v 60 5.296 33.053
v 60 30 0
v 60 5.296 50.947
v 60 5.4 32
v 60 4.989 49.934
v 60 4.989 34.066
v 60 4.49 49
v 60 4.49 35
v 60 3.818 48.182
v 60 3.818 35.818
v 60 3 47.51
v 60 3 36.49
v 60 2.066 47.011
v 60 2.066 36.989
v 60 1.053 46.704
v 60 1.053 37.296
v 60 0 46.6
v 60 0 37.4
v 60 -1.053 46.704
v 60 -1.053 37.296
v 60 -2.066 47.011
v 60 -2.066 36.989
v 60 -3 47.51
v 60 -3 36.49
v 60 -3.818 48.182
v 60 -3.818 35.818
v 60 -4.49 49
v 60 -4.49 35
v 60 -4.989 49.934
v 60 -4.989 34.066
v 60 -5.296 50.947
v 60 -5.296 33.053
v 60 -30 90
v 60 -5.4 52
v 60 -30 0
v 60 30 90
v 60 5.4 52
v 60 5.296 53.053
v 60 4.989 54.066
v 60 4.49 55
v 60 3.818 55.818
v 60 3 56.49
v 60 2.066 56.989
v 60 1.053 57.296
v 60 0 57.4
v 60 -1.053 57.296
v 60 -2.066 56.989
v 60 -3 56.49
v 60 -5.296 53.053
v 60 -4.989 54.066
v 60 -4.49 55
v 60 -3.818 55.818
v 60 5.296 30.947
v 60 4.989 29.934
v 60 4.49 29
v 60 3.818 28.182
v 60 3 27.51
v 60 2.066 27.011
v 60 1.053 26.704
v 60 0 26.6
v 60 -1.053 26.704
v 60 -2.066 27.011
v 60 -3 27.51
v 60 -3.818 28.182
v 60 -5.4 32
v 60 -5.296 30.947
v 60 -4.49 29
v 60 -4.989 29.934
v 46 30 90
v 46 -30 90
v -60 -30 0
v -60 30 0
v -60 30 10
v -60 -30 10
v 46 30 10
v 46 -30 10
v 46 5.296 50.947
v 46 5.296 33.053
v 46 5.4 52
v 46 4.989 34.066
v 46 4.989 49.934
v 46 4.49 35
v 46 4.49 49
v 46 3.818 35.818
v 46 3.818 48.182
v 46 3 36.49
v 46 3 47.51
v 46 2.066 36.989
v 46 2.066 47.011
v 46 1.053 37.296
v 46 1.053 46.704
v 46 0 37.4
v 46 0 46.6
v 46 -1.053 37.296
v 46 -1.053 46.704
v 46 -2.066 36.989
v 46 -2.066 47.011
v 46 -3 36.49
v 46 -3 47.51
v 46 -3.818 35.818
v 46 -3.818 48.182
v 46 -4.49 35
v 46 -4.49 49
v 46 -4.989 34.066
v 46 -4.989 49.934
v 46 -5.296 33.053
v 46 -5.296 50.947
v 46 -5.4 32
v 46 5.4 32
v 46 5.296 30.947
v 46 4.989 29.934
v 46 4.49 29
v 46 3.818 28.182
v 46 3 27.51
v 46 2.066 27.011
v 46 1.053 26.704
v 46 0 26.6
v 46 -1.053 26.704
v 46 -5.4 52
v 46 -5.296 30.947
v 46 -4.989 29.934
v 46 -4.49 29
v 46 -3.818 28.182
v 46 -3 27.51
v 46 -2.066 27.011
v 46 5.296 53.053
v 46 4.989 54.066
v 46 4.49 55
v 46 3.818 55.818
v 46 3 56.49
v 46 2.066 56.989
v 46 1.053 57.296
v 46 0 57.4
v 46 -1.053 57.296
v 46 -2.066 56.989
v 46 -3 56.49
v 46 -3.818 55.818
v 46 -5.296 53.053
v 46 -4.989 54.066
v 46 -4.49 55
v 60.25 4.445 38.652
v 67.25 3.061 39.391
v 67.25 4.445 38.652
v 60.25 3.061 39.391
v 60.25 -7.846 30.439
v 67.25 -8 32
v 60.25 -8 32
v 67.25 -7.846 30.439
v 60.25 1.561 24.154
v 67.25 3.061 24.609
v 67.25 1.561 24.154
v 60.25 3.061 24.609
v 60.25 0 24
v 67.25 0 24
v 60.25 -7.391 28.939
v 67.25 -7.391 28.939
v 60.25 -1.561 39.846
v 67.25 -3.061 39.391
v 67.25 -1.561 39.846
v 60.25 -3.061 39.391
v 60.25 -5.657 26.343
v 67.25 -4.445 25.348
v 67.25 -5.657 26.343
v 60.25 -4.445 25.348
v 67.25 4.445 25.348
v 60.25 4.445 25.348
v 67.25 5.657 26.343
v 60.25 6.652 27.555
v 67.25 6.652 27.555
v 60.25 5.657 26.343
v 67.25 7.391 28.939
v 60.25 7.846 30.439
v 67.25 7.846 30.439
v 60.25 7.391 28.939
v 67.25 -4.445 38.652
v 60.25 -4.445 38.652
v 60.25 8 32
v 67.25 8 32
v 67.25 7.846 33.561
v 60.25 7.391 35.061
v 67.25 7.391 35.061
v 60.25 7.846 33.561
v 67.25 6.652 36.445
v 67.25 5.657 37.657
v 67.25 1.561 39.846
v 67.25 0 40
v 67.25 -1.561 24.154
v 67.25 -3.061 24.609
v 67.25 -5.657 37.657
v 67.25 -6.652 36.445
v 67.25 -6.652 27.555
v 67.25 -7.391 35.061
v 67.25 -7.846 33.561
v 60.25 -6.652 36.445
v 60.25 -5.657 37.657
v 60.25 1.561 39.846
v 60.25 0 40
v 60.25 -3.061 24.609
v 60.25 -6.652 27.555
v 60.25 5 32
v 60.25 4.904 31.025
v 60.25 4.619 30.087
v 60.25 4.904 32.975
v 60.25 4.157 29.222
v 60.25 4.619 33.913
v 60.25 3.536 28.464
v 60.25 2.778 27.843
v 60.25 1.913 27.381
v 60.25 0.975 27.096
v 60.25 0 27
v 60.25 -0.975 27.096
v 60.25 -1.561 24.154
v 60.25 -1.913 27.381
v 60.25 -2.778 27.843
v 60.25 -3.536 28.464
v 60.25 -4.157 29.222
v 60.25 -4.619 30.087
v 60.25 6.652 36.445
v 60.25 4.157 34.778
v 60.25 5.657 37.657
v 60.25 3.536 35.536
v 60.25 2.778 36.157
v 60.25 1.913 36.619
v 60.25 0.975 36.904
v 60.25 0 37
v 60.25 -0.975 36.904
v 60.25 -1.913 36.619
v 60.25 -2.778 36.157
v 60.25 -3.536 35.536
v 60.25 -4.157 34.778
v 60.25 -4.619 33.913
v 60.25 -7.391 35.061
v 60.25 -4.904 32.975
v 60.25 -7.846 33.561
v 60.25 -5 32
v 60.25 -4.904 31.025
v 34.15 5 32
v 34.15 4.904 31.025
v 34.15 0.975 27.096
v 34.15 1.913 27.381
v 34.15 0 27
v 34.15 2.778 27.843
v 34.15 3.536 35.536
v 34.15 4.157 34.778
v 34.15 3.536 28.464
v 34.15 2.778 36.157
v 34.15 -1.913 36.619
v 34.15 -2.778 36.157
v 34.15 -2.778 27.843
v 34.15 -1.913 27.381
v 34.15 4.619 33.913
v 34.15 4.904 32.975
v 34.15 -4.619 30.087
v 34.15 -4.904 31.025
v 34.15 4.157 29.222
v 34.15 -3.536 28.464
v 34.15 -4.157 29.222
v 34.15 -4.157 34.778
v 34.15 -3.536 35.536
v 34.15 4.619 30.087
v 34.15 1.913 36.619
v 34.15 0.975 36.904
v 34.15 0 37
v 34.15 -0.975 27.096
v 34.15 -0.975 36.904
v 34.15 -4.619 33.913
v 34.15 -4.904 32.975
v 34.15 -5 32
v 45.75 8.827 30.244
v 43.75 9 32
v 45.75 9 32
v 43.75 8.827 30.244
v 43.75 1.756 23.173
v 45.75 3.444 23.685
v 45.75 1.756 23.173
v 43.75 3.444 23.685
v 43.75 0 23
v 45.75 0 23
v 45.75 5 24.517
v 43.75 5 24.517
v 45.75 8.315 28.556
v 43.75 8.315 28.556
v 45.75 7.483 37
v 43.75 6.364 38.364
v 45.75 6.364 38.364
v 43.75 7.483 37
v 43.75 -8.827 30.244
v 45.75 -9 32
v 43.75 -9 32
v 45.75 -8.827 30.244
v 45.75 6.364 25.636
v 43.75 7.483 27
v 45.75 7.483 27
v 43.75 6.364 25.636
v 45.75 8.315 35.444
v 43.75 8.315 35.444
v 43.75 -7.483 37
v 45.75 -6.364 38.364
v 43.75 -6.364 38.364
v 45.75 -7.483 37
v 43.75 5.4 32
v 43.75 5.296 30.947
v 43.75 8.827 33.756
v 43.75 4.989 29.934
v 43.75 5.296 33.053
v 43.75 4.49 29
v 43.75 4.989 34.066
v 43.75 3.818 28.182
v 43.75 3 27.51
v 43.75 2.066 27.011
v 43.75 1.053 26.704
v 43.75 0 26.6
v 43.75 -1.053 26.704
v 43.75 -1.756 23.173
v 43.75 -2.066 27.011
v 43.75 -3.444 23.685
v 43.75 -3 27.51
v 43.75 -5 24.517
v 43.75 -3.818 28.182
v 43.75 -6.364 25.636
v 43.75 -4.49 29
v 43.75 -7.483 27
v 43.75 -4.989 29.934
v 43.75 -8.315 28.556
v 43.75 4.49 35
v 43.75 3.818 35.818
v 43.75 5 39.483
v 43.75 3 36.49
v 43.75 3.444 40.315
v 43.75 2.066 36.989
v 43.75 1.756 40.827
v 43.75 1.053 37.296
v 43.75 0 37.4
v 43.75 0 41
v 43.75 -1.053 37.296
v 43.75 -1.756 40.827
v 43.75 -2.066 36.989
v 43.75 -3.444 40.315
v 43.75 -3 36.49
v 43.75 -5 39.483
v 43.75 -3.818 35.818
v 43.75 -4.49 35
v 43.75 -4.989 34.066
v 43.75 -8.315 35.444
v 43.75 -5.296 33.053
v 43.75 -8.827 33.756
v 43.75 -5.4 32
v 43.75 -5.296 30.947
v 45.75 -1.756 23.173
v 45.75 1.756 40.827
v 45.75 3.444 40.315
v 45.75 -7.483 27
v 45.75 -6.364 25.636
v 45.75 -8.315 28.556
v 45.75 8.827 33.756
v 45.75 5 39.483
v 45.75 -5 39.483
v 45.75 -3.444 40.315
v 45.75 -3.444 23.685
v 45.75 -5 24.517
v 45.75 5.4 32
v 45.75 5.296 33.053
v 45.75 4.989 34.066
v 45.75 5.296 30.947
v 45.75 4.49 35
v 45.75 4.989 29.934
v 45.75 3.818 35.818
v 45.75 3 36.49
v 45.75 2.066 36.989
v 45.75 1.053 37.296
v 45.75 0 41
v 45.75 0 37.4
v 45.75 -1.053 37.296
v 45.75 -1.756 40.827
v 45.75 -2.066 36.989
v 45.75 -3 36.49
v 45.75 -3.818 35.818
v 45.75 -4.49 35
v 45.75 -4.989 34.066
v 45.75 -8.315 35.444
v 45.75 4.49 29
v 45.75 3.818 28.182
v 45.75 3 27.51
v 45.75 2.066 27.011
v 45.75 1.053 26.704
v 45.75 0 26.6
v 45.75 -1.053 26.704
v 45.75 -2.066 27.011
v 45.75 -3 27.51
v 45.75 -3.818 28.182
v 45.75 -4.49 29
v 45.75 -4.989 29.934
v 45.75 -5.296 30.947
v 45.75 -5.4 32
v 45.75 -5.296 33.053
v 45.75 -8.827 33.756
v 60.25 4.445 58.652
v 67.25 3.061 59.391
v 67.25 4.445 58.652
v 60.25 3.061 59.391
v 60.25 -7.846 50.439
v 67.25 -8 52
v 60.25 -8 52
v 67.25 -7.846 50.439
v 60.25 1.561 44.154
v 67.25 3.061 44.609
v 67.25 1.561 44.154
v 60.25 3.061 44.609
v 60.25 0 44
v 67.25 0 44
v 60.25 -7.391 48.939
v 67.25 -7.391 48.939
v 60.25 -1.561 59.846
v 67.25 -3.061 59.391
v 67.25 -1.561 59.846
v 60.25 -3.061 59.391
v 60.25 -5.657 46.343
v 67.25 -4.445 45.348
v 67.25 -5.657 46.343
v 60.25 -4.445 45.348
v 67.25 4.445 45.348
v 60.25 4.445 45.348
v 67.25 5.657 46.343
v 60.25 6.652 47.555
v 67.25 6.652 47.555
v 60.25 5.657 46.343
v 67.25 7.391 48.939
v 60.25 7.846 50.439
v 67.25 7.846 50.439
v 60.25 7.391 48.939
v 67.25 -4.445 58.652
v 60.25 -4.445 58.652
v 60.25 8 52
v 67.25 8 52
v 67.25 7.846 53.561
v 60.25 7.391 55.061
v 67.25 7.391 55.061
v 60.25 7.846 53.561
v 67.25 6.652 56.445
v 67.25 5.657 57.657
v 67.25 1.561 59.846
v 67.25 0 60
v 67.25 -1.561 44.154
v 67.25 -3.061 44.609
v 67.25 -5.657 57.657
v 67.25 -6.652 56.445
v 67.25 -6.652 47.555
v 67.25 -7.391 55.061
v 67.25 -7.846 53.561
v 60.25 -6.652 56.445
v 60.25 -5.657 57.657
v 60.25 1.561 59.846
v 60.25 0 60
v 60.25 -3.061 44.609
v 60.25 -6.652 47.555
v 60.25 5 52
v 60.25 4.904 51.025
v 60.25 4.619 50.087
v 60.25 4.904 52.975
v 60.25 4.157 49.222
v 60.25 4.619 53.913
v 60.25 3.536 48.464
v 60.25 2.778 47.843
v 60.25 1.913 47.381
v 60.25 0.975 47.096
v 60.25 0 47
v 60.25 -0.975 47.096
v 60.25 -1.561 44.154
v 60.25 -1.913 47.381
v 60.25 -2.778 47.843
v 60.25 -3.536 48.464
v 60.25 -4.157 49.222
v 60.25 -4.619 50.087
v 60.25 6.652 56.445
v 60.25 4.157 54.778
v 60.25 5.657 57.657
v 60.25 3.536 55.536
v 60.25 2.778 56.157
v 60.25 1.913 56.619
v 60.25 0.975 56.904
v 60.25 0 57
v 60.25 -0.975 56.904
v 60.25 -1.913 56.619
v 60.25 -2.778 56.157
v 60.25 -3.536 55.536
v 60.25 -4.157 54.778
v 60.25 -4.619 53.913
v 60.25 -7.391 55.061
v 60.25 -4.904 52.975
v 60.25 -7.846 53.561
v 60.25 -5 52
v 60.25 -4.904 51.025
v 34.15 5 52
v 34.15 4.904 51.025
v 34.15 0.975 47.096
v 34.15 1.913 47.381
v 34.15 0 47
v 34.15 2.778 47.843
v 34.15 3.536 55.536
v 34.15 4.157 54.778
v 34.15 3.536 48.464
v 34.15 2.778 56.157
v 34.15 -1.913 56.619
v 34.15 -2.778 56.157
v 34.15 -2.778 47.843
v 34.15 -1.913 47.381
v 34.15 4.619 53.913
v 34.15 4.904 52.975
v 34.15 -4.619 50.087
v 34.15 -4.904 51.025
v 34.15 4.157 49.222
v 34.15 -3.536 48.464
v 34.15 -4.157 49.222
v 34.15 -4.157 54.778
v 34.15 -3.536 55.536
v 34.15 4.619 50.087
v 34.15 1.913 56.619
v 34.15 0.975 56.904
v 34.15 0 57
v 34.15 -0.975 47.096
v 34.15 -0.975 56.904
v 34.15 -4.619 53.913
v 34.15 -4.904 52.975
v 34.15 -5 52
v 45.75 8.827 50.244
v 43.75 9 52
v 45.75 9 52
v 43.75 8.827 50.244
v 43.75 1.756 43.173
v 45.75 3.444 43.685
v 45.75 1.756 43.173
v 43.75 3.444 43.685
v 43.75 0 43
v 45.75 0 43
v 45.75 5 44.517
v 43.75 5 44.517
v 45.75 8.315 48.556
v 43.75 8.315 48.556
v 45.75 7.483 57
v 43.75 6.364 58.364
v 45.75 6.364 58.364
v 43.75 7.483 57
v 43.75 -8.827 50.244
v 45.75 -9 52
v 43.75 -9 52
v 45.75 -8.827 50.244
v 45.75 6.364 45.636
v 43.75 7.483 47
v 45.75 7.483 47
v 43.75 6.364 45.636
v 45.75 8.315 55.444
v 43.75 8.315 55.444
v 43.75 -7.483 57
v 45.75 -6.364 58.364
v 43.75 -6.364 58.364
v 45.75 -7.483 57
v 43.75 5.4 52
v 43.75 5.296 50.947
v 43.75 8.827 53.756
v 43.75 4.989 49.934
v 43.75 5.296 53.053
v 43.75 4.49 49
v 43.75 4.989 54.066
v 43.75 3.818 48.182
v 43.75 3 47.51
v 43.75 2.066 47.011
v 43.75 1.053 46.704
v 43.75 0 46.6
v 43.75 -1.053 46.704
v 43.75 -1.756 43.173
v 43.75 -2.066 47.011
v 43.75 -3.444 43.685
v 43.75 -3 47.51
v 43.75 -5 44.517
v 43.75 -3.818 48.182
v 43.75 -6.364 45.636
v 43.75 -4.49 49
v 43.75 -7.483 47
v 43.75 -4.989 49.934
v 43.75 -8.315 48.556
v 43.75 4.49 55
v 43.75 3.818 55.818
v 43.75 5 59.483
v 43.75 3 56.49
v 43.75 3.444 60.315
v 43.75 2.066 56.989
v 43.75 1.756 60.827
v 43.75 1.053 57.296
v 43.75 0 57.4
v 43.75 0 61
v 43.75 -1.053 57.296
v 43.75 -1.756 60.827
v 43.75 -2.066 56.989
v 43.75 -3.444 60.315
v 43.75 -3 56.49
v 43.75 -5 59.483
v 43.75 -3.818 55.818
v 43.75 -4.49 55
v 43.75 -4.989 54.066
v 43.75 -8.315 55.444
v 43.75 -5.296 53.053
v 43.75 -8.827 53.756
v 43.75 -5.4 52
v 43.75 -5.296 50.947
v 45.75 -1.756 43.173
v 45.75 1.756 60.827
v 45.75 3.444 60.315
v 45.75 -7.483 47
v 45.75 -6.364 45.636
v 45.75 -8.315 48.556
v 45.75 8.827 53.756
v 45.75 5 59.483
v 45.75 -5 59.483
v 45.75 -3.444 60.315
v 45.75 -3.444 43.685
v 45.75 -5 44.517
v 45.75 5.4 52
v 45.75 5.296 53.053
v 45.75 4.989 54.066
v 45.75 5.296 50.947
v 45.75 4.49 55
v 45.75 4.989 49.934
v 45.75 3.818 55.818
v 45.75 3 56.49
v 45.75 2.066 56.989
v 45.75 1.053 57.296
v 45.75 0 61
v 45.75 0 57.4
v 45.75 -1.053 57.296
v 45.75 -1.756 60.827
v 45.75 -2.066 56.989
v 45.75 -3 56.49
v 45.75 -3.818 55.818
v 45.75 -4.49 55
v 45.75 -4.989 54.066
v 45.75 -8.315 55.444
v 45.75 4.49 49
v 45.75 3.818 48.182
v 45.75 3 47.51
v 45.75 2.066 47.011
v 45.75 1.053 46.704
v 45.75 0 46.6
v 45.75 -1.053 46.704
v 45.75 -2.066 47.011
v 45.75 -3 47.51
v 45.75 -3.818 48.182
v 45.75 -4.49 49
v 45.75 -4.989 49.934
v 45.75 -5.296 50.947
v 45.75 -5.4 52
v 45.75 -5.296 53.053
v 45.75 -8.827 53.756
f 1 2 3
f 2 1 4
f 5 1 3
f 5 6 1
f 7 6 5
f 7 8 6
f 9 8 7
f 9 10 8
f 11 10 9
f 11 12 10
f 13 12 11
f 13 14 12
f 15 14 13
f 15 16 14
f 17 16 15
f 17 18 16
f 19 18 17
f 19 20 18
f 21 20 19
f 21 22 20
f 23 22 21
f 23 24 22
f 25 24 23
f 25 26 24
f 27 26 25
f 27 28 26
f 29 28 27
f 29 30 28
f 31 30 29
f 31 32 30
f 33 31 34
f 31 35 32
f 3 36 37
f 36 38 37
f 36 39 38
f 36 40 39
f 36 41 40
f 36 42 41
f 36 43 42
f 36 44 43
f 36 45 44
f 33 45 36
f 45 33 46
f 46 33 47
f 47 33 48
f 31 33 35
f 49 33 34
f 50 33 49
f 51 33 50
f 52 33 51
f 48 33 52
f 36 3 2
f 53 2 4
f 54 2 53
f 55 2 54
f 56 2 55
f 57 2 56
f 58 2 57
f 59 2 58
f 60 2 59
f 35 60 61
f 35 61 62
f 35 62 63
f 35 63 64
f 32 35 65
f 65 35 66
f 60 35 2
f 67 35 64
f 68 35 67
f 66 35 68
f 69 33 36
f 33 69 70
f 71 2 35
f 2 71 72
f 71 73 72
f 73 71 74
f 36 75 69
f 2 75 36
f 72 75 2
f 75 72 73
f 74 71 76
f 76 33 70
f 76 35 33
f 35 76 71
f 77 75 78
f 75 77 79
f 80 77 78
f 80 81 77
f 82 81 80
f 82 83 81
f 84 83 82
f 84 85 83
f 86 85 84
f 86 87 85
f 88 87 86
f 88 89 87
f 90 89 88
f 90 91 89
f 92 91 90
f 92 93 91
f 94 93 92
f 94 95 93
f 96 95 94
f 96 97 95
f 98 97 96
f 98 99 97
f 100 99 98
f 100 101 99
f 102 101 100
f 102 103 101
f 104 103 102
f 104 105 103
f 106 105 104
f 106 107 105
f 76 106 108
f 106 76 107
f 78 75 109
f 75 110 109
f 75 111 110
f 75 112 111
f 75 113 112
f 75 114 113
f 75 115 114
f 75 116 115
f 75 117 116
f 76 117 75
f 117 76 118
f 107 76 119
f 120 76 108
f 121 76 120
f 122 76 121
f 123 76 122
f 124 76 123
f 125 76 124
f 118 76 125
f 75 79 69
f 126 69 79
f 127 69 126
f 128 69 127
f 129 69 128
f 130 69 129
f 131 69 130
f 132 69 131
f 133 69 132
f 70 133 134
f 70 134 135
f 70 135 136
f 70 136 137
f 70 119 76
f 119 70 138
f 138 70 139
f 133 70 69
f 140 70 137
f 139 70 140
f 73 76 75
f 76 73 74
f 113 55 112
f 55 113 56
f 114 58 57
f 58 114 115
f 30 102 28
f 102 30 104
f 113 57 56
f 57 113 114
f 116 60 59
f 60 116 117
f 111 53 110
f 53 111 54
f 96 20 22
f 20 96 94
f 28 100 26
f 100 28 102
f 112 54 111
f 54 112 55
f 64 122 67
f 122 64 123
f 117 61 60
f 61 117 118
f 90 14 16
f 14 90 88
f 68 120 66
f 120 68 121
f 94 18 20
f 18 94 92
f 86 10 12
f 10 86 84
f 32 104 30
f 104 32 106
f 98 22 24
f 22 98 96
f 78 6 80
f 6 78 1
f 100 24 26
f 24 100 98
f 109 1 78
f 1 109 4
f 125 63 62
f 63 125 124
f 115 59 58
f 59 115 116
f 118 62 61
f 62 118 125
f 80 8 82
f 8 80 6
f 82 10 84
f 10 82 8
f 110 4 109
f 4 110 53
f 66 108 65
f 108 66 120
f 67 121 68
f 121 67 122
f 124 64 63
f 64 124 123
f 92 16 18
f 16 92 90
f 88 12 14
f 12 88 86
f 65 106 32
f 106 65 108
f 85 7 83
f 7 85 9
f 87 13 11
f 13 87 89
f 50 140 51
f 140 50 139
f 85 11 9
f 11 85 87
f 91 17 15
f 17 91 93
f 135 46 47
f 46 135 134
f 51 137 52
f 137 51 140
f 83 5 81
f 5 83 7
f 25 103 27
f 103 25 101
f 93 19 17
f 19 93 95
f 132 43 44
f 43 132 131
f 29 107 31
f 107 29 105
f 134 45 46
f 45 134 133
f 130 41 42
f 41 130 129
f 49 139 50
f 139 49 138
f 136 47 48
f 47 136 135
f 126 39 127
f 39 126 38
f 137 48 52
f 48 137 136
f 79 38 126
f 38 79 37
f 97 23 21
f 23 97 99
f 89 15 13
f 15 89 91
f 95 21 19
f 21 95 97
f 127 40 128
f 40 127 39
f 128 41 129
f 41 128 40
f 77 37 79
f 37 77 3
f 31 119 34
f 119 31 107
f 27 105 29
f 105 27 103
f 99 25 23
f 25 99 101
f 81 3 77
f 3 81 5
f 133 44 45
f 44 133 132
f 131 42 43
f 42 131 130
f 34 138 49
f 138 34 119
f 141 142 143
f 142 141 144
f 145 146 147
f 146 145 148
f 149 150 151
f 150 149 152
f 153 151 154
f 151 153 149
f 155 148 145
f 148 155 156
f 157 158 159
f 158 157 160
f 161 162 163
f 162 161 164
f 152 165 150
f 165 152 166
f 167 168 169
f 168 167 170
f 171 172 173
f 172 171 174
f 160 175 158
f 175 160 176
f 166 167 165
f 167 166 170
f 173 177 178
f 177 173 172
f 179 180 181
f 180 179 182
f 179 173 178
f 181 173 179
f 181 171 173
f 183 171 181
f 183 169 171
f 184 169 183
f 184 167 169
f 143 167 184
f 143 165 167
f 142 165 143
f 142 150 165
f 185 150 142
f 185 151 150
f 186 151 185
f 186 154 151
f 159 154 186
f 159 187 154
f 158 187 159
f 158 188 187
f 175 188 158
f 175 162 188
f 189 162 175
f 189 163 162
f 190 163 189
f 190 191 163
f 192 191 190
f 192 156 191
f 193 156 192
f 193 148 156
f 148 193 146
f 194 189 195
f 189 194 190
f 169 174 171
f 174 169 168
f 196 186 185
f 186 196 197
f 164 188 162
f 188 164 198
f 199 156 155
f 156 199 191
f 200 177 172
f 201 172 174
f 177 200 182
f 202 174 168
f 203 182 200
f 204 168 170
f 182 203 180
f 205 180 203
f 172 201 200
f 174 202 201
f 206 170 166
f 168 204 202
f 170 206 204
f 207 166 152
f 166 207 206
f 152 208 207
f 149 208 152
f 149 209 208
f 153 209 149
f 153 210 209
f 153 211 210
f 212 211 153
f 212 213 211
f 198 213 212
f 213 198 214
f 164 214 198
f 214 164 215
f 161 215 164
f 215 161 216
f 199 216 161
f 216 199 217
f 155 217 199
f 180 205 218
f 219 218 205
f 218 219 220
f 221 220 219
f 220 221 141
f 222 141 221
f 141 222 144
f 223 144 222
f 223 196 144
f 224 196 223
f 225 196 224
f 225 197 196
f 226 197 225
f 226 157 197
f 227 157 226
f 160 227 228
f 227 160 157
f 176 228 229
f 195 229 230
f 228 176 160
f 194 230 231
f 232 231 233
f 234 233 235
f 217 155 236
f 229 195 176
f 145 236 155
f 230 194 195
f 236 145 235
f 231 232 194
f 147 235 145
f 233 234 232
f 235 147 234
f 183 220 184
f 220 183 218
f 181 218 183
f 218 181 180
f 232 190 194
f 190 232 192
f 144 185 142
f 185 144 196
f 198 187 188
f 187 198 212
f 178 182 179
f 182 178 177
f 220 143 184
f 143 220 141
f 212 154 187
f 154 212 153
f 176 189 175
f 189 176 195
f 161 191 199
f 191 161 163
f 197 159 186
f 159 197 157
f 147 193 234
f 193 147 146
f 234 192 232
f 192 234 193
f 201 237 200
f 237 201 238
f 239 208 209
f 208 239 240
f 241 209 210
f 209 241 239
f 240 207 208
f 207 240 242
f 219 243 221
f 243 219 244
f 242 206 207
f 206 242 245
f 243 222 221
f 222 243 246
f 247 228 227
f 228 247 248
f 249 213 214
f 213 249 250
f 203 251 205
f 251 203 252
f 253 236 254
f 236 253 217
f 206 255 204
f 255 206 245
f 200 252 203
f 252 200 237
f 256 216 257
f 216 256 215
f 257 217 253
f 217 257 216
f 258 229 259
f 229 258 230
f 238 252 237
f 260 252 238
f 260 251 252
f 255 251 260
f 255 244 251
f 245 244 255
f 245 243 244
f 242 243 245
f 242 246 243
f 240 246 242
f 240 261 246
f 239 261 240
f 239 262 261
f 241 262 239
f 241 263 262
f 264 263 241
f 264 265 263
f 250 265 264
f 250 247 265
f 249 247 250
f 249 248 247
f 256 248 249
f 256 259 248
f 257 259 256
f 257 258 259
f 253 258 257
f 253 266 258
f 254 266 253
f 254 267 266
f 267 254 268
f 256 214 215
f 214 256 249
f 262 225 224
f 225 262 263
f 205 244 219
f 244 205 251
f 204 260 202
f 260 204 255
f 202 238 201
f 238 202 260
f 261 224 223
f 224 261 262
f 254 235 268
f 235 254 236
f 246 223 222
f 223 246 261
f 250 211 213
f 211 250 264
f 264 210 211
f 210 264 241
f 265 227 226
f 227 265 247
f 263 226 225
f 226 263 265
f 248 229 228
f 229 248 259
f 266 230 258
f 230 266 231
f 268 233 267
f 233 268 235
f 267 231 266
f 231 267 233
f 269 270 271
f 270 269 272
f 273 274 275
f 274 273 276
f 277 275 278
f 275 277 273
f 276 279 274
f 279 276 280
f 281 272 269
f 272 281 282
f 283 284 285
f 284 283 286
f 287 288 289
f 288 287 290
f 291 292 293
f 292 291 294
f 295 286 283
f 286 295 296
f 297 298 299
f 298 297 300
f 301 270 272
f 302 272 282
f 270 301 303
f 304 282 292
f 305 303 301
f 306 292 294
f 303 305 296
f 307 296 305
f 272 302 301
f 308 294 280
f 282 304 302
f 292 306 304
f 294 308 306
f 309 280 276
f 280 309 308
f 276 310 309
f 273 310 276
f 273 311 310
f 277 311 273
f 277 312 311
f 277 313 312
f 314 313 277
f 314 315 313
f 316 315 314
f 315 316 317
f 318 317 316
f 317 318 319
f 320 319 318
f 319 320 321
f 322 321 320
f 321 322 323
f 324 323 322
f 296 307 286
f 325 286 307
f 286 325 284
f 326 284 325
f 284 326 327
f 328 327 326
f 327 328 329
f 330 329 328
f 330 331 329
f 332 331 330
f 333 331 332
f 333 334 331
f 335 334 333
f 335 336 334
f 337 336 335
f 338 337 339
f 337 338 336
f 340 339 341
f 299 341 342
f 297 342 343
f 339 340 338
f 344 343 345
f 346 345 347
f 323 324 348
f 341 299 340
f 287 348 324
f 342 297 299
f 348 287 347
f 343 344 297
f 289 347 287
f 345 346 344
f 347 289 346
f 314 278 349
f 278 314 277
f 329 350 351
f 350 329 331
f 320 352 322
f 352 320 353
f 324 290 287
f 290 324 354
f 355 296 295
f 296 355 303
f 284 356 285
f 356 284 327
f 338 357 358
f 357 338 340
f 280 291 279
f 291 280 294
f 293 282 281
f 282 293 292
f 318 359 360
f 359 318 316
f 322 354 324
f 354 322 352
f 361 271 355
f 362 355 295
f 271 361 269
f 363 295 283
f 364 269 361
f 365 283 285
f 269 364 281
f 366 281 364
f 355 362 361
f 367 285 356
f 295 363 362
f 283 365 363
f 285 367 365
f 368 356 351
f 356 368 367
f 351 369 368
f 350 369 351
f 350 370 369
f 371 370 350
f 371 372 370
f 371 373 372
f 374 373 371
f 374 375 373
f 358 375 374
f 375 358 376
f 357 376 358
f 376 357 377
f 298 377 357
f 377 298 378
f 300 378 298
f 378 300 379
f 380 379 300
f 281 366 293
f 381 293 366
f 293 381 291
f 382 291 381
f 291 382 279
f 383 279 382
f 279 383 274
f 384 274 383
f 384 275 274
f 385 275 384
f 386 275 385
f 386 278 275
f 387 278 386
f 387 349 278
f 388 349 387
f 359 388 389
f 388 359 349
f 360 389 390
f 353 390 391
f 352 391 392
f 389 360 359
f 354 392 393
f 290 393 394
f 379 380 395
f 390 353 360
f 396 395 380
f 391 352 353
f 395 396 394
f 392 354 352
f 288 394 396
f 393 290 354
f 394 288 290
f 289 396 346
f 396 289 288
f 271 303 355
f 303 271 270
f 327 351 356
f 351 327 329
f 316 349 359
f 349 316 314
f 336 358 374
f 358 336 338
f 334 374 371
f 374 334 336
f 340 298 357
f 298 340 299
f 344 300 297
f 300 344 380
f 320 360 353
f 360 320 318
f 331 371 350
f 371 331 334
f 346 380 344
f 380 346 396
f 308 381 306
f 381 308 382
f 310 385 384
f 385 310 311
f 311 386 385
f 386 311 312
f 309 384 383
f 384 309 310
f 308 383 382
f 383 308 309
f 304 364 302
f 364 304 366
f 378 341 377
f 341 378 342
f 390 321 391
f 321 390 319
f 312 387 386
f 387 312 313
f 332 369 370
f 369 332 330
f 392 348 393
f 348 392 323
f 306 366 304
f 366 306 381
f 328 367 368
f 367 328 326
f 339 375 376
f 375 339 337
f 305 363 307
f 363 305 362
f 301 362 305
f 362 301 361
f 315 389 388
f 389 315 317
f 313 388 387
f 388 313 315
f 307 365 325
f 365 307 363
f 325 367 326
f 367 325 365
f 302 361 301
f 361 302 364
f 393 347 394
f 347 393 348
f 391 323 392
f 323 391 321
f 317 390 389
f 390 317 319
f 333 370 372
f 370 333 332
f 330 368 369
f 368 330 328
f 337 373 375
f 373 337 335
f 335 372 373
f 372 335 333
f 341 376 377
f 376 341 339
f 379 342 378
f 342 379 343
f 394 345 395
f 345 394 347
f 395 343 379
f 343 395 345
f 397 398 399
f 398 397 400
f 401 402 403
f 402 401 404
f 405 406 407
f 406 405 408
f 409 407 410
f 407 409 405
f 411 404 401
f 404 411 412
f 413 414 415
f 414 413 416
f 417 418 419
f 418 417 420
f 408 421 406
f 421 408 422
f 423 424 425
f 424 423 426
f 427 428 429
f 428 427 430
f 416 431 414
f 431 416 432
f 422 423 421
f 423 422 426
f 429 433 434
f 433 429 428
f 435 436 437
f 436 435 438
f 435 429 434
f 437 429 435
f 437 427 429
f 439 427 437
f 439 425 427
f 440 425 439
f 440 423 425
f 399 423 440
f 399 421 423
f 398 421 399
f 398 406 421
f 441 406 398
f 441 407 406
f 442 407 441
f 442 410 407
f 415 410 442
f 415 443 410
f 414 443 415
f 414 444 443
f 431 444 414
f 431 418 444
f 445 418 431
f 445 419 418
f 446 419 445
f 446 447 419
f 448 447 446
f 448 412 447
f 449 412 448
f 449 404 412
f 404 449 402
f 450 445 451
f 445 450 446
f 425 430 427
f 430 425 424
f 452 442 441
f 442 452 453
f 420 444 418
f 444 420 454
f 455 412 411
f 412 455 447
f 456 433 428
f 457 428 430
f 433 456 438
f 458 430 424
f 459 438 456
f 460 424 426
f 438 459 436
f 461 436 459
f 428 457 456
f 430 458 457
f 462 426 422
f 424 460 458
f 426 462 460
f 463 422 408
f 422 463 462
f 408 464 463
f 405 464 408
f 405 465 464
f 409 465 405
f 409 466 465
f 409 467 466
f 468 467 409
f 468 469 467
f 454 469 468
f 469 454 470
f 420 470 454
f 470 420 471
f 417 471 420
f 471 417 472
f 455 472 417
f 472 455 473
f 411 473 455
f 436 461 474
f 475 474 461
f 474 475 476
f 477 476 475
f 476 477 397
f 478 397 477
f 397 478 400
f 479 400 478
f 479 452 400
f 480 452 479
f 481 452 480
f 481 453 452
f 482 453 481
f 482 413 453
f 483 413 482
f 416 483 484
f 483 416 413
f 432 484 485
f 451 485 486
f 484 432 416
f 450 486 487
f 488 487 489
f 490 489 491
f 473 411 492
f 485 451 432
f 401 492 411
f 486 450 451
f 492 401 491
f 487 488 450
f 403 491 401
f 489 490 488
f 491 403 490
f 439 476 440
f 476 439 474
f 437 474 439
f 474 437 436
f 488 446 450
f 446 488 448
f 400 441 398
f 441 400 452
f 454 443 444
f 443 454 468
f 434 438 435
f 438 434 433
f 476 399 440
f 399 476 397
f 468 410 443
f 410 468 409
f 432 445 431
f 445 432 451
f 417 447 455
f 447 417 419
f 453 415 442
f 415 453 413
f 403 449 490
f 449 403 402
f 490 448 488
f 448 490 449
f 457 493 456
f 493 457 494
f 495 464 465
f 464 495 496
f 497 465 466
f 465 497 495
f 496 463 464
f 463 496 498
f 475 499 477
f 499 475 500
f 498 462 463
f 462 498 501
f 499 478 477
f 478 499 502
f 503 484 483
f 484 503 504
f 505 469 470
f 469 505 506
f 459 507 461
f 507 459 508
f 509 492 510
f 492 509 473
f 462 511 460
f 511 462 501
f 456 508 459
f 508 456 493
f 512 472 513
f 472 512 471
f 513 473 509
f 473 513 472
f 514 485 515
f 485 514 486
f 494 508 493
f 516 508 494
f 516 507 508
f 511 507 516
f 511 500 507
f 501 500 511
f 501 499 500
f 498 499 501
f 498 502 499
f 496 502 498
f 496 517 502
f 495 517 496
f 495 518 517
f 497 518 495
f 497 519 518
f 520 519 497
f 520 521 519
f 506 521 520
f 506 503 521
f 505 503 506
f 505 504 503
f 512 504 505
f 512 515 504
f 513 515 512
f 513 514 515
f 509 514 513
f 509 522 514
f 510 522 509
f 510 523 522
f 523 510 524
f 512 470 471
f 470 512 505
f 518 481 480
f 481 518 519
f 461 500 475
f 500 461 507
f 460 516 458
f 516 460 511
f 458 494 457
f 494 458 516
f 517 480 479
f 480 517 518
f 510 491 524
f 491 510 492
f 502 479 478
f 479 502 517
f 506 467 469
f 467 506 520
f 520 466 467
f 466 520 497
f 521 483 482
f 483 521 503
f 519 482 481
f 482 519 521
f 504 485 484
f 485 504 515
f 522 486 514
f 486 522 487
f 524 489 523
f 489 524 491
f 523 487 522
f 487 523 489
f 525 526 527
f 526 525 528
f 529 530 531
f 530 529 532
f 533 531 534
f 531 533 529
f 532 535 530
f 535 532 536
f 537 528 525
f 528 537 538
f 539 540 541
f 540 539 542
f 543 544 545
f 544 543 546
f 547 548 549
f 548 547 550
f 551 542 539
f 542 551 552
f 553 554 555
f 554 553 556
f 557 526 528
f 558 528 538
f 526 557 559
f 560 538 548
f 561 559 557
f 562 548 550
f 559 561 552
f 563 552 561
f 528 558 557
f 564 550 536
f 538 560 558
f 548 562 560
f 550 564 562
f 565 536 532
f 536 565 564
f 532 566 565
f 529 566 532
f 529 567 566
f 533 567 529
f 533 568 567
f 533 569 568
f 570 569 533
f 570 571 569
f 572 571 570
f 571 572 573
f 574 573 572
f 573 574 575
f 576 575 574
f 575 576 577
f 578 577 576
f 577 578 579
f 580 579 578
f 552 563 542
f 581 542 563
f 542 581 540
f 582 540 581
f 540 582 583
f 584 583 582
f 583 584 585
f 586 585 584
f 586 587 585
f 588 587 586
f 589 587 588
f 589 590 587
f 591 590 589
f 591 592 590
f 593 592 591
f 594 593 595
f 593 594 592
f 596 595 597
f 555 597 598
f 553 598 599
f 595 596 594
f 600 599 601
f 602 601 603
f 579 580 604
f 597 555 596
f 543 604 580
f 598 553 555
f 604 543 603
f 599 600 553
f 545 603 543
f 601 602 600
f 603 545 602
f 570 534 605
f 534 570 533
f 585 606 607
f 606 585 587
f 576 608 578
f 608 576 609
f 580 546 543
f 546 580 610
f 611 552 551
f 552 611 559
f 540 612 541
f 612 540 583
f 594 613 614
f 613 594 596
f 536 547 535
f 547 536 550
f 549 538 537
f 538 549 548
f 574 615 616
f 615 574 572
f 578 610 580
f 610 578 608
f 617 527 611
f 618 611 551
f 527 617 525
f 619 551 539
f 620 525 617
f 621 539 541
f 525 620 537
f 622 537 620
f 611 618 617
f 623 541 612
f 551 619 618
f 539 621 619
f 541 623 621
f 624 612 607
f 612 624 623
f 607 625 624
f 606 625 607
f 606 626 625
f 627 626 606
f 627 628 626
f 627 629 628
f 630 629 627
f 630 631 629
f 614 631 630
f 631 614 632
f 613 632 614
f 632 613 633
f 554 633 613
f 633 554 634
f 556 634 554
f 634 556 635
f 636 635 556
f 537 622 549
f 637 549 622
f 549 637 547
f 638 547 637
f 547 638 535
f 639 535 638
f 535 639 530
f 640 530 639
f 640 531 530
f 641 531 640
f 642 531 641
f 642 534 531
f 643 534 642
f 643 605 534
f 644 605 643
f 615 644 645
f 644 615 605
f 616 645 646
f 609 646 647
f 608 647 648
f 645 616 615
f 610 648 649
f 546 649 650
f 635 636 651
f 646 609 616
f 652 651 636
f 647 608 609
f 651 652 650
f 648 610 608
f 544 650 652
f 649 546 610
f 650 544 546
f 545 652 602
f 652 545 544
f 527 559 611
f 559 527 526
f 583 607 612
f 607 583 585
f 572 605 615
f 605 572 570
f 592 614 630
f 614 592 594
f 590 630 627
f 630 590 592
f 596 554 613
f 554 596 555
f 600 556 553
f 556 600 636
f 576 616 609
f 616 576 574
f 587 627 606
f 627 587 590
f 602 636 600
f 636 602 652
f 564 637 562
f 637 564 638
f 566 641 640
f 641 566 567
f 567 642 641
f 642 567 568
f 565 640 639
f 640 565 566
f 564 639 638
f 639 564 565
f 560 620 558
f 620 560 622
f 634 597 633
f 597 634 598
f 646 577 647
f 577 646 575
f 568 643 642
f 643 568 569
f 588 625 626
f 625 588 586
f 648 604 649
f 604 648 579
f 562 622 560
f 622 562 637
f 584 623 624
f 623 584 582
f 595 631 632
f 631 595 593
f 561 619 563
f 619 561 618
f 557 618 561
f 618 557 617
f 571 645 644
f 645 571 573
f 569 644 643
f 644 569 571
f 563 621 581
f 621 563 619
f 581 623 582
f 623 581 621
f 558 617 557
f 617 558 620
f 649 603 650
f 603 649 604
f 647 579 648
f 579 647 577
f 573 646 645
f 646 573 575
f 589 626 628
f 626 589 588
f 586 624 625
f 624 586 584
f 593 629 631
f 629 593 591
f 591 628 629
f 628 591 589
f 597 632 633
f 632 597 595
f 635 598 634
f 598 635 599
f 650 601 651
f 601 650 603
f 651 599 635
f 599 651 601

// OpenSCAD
$fn = 32;

// ------------------------------------------------------------------------
// Bolted bracket: 120 x 60 mm bracket with 2 bolt joints
// Every part is its own module, assembly() places them once.
// ------------------------------------------------------------------------

// --- part 1 ---
module bracket() {
  difference() {
    translate([-60, -30, 0]) cube([120, 60, 90]);
    translate([-61, -31, 10]) cube([107, 62, 81]);
    translate([53, 0, 32]) rotate([0, 90, 0]) cylinder(h = 16, d = 10.8, center = true);
    translate([53, 0, 52]) rotate([0, 90, 0]) cylinder(h = 16, d = 10.8, center = true);
  }
}

// --- part 2 ---
module bolt1() {
  cylinder(h = 7, d = 16);
  translate([0, 0, -26.1]) cylinder(h = 26.1, d = 10);
}

// --- part 3 ---
module washer1() {
  difference() {
      translate([0, 0, 0]) cylinder(h = 2, d = 18);
      translate([0, 0, -1]) cylinder(h = 4, d = 10.8);
    }
}

// --- part 4 ---
module bolt2() {
  cylinder(h = 7, d = 16);
  translate([0, 0, -26.1]) cylinder(h = 26.1, d = 10);
}

// --- part 5 ---
module washer2() {
  difference() {
      translate([0, 0, 0]) cylinder(h = 2, d = 18);
      translate([0, 0, -1]) cylinder(h = 4, d = 10.8);
    }
}

// --- assembly ---
module assembly() {
  translate([0, 0, 0]) rotate([0, 0, 0]) bracket();
  translate([60.25, 0, 32]) rotate([0, 90, 0]) bolt1();
  translate([43.75, 0, 32]) rotate([0, 90, 0]) washer1();
  translate([60.25, 0, 52]) rotate([0, 90, 0]) bolt2();
  translate([43.75, 0, 52]) rotate([0, 90, 0]) washer2();
}

assembly();
